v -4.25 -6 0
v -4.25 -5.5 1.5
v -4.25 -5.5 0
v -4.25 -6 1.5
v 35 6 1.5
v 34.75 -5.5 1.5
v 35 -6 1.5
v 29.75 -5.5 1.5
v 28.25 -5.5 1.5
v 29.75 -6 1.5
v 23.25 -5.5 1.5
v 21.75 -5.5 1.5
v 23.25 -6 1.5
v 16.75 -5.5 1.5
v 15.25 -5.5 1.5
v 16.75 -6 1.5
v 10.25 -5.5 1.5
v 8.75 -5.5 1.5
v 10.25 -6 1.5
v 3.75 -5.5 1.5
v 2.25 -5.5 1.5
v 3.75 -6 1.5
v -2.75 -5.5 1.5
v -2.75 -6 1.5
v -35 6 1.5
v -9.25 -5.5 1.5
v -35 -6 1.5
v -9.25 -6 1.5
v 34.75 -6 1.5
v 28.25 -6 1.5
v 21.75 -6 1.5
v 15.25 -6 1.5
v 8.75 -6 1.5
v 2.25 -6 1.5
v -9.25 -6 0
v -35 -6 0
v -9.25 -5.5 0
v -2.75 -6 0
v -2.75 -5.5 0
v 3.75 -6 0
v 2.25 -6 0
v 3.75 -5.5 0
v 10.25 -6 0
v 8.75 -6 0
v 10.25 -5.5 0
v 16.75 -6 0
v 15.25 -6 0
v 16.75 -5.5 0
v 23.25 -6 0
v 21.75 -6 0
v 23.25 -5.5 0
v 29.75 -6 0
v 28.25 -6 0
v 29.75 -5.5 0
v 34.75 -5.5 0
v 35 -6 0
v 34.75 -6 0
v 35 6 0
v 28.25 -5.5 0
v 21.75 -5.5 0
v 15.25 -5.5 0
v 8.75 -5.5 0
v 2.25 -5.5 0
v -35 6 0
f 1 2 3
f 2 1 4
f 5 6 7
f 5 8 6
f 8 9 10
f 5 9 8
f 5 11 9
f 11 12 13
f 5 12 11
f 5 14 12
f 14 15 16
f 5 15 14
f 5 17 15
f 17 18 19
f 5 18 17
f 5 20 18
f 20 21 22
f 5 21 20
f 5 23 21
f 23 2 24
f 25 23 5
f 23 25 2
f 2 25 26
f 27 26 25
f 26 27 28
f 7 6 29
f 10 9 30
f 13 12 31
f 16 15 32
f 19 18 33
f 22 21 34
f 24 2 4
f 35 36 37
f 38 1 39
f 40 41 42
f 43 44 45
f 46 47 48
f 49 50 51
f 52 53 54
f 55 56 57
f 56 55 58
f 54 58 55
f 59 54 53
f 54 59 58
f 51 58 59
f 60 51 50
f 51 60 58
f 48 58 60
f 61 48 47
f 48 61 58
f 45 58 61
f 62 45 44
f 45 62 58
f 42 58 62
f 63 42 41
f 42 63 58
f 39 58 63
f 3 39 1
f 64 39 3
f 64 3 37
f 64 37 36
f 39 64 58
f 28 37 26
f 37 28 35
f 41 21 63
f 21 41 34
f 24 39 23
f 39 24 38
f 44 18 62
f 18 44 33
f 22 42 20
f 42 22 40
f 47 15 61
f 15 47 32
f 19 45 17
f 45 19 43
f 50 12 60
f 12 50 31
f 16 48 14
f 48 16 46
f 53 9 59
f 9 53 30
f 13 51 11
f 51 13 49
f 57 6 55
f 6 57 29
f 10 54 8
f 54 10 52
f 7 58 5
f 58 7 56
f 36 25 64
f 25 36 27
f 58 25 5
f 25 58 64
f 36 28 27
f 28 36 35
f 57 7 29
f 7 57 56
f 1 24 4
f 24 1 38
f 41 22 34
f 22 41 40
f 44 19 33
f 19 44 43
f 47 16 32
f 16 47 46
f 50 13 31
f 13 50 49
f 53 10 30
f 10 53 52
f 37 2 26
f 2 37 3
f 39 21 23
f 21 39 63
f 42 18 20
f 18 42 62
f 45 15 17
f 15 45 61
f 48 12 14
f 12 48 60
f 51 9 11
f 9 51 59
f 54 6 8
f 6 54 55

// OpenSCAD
// 10-well comb for casting agarose gels
// Print orientation: flat on bed, teeth pointing down (-Y)

// ---------- Parameters ----------
plate_t      = 1.5;    // plate thickness (Z)
spine_l      = 70;     // spine length (X)
spine_w      = 12;     // spine width (Y)
tooth_n      = 10;     // number of teeth
tooth_w      = 5.0;    // tooth width (X)
tooth_l      = 12;     // tooth length (Y)
gap          = 1.5;    // gap between teeth (X)
overcut      = 0.5;    // extra length for clean cuts
$fn          = 64;

// ---------- Derived ----------
pitch   = tooth_w + gap;
x_start = -(tooth_n - 1) * gap / 2;  // first tooth left edge

// ---------- Model ----------
difference() {
    union() {
        // Spine
        translate([-spine_l / 2, -spine_w / 2, 0])
            cube([spine_l, spine_w, plate_t]);
        // Teeth
        for (i = [0 : tooth_n - 1])
            translate([x_start + i * pitch - tooth_w / 2,
                       -spine_w / 2 - tooth_l,
                       0])
                cube([tooth_w, tooth_l + overcut, plate_t]);
    }
    // Cut teeth into the spine (extend past top and bottom faces)
    for (i = [0 : tooth_n - 1])
        translate([x_start + i * pitch - tooth_w / 2,
                   -spine_w / 2 - tooth_l - overcut,
                   -overcut])
            cube([tooth_w, tooth_l + 2 * overcut, plate_t + 2 * overcut]);
}
